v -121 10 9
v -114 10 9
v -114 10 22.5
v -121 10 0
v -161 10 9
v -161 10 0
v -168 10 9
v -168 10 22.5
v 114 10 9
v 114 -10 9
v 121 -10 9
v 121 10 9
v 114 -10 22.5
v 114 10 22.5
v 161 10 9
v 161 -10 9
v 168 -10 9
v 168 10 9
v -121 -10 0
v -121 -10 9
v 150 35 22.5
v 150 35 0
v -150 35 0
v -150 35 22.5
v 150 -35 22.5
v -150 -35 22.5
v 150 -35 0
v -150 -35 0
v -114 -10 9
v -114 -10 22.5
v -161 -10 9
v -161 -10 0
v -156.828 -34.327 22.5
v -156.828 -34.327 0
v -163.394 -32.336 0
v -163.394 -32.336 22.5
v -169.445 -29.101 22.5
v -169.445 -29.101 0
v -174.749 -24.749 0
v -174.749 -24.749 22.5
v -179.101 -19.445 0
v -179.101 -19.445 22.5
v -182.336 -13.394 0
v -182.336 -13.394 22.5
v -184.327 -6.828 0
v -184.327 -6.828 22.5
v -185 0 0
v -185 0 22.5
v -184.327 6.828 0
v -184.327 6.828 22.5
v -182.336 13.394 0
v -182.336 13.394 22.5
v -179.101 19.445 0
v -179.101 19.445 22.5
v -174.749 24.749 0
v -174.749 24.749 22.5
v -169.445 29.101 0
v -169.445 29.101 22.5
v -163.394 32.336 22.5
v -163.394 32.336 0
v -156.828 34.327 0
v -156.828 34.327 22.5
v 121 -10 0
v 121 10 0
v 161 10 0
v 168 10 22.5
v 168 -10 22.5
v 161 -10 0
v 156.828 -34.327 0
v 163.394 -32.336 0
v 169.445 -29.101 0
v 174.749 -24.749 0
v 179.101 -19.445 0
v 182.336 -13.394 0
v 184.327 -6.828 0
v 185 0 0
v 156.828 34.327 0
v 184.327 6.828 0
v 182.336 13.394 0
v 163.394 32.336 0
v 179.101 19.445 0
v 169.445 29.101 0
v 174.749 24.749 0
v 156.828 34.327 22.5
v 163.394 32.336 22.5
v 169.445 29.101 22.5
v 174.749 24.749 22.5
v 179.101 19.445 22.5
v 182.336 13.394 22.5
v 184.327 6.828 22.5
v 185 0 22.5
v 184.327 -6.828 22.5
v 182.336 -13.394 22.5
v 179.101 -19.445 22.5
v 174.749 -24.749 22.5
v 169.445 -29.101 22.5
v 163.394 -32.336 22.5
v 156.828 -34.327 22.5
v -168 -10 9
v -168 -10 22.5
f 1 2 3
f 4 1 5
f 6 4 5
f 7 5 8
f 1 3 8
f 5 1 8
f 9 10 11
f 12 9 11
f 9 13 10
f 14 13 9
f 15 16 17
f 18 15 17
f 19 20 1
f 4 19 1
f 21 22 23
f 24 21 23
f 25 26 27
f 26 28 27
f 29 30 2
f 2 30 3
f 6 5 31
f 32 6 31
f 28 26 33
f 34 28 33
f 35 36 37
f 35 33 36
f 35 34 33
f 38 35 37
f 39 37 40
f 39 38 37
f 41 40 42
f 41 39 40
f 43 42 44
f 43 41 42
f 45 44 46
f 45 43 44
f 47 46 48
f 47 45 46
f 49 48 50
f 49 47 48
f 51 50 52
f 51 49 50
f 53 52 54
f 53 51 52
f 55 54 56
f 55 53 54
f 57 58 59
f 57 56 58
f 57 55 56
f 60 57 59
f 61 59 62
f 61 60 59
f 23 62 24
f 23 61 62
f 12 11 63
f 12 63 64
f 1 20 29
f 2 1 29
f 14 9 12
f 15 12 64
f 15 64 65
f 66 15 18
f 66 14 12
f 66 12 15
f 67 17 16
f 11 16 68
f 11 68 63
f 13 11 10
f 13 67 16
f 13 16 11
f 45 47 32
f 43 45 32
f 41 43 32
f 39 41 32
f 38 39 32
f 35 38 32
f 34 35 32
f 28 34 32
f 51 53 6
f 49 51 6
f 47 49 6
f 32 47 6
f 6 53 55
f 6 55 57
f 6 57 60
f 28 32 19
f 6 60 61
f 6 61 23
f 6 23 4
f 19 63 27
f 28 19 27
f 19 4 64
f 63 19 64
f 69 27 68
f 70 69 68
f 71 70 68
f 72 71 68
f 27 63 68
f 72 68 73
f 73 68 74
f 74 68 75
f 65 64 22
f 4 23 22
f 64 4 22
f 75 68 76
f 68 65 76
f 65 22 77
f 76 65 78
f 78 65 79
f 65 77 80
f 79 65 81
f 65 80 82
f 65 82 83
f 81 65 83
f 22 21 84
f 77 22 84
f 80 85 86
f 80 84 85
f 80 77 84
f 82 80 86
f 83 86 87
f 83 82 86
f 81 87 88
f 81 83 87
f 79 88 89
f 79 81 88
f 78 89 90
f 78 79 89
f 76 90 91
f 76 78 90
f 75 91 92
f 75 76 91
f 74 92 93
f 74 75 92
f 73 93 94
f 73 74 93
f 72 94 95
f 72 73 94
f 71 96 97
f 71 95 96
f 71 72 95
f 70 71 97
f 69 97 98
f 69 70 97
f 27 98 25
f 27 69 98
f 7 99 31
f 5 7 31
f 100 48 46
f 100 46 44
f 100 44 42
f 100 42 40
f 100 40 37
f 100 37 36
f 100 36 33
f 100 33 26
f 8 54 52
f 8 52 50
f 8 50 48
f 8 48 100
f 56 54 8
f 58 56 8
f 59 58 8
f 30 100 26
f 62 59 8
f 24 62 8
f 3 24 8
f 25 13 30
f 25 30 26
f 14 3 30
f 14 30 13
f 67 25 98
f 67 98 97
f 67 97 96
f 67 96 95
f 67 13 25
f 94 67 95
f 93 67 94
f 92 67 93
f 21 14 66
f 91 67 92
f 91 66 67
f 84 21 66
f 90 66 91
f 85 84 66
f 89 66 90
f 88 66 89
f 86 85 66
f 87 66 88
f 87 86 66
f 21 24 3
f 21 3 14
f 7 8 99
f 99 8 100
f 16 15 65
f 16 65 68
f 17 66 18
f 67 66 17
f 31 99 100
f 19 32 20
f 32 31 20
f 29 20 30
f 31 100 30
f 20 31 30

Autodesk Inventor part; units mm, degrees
ref_plane "YZ Plane" through (0, 0, 0) normal (1, 0, 0) x (0, 1, 0)
ref_plane "XZ Plane" through (0, 0, 0) normal (0, 1, 0) x (-1, 0, 0)
ref_plane "XY Plane" through (0, 0, 0) normal (0, 0, 1) x (1, 0, 0)
sketch "Sketch1" plane through (0, 0, 0) normal (0, 0, 1) x (1, 0, 0)
  line L0 (-150, 0) -> (150, 0) construction
  line L1 (-150, -35) -> (150, -35)
  line L2 (150, 35) -> (-150, 35)
  arc A0 (-150, 35) -> (-150, -35) centre (-150, 0) ccw
  arc A1 (150, -35) -> (150, 35) centre (150, 0) ccw
  point P0 (0, 0)
  dimension "d0" = 150
  dimension "d1" = 70
extrude "Extrusion1" add sketch "Sketch1" along normal blind 22.5
sketch "Sketch2" plane through (0, 0, 22.5) normal (0, 0, 1) x (1, 0, 0)
  arc A0 (150, -35) -> (150, 35) centre (150, 0) ccw projected
  line L0 (114, 10) -> (168, 10)
  line L1 (168, 10) -> (168, -10)
  line L2 (168, -10) -> (114, -10)
  line L3 (114, -10) -> (114, 10)
  line L4 (121, 10) -> (161, 10)
  line L5 (161, 10) -> (161, -10)
  line L6 (161, -10) -> (121, -10)
  line L7 (121, -10) -> (121, 10)
  line L8 (114, 0) -> (121, 0)
  line L9 (0, 35) -> (0, -35)
  arc A1 (-150, 35) -> (-150, -35) centre (-150, 0) ccw
  line L10 (-114, 10) -> (-168, 10)
  line L11 (-168, 10) -> (-168, -10)
  line L12 (-168, -10) -> (-114, -10)
  line L13 (-114, -10) -> (-114, 10)
  line L14 (-121, 10) -> (-161, 10)
  line L15 (-161, 10) -> (-161, -10)
  line L16 (-161, -10) -> (-121, -10)
  line L17 (-121, -10) -> (-121, 10)
  line L18 (-114, 0) -> (-121, 0)
  point P0 (0, 0)
  point P1 (168, 0)
  point P2 (121, -10)
  point P3 (161, 10)
  point P4 (-168, 0)
  point P5 (-121, -10)
  point P6 (-161, 10)
  dimension "d4" = 54
  dimension "d5" = 40
  dimension "d6" = 7
  dimension "d7" = 20
  dimension "d8" = 36
extrude "Extrusion2" cut sketch "Sketch2" against normal through all contours L0 L5 L2 L7 | L17 L12 L15 L10
extrude "Extrusion3" cut sketch "Sketch2" against normal blind 13.5 contours L0 L7 L8 L3 | L8 L7 L2 L3 | L0 L1 L2 L5 | L13 L18 L17 L10 | L13 L12 L17 L18 | L15 L12 L11 L10
properties part number "arm 2 right"
